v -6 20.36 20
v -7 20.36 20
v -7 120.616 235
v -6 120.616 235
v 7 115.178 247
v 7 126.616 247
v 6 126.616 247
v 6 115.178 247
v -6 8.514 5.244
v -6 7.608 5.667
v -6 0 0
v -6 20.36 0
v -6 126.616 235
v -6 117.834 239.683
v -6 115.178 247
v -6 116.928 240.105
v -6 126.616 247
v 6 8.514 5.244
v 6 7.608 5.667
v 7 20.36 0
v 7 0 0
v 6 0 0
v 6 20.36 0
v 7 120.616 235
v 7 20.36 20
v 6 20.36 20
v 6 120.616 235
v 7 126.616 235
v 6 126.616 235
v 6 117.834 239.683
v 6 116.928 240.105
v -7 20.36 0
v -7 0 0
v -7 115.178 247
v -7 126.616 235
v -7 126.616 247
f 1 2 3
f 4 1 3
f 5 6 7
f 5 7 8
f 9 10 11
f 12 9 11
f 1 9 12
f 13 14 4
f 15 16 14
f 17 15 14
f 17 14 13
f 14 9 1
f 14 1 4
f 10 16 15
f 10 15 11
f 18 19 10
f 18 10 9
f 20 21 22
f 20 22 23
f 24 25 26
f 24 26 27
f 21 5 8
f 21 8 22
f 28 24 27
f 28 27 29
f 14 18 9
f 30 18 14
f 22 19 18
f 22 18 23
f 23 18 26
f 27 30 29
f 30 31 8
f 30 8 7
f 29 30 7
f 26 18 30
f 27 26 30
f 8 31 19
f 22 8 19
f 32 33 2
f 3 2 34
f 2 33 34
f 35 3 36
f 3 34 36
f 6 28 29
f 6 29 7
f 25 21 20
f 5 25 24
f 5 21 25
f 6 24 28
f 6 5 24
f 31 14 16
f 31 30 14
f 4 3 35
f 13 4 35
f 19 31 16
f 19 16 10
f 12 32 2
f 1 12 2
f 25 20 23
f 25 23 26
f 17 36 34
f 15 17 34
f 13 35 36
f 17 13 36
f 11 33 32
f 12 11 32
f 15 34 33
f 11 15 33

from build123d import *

# Parameters (mm, degrees)
F2_DEPTH      = 1
F5_DEPTH      = 6
F5_DEPTH_BACK = 6


with BuildPart() as f2:
    # F1 (on offset) → F2 (new body)
    with BuildSketch(Plane.YZ.offset(-7)):
        Polygon((115.177992, 247), (0, 0), (20.359932, 0), (20.359932, 20), (120.616079, 235), (126.616079, 235), (126.616079, 247), align=None)
    extrude(amount=F2_DEPTH)



with BuildPart() as f3_1:
    # F3: instance of F2
    add(f2.part.mirror(Plane.YZ))


with BuildPart() as f2_1:
    add(f2.part)

    add(f3_1.part)  # F5 merges F3_1
    # F4 (on Right) → F5 (join, two sides)
    with BuildSketch(Plane.YZ) as f5_sk:
        Polygon((117.834365, 239.682502), (116.928057, 240.10512), (7.607535, 5.666504), (8.513843, 5.243886), align=None)
    extrude(amount=F5_DEPTH)
    extrude(f5_sk.sketch, amount=-F5_DEPTH_BACK)


solid = f2_1.part
